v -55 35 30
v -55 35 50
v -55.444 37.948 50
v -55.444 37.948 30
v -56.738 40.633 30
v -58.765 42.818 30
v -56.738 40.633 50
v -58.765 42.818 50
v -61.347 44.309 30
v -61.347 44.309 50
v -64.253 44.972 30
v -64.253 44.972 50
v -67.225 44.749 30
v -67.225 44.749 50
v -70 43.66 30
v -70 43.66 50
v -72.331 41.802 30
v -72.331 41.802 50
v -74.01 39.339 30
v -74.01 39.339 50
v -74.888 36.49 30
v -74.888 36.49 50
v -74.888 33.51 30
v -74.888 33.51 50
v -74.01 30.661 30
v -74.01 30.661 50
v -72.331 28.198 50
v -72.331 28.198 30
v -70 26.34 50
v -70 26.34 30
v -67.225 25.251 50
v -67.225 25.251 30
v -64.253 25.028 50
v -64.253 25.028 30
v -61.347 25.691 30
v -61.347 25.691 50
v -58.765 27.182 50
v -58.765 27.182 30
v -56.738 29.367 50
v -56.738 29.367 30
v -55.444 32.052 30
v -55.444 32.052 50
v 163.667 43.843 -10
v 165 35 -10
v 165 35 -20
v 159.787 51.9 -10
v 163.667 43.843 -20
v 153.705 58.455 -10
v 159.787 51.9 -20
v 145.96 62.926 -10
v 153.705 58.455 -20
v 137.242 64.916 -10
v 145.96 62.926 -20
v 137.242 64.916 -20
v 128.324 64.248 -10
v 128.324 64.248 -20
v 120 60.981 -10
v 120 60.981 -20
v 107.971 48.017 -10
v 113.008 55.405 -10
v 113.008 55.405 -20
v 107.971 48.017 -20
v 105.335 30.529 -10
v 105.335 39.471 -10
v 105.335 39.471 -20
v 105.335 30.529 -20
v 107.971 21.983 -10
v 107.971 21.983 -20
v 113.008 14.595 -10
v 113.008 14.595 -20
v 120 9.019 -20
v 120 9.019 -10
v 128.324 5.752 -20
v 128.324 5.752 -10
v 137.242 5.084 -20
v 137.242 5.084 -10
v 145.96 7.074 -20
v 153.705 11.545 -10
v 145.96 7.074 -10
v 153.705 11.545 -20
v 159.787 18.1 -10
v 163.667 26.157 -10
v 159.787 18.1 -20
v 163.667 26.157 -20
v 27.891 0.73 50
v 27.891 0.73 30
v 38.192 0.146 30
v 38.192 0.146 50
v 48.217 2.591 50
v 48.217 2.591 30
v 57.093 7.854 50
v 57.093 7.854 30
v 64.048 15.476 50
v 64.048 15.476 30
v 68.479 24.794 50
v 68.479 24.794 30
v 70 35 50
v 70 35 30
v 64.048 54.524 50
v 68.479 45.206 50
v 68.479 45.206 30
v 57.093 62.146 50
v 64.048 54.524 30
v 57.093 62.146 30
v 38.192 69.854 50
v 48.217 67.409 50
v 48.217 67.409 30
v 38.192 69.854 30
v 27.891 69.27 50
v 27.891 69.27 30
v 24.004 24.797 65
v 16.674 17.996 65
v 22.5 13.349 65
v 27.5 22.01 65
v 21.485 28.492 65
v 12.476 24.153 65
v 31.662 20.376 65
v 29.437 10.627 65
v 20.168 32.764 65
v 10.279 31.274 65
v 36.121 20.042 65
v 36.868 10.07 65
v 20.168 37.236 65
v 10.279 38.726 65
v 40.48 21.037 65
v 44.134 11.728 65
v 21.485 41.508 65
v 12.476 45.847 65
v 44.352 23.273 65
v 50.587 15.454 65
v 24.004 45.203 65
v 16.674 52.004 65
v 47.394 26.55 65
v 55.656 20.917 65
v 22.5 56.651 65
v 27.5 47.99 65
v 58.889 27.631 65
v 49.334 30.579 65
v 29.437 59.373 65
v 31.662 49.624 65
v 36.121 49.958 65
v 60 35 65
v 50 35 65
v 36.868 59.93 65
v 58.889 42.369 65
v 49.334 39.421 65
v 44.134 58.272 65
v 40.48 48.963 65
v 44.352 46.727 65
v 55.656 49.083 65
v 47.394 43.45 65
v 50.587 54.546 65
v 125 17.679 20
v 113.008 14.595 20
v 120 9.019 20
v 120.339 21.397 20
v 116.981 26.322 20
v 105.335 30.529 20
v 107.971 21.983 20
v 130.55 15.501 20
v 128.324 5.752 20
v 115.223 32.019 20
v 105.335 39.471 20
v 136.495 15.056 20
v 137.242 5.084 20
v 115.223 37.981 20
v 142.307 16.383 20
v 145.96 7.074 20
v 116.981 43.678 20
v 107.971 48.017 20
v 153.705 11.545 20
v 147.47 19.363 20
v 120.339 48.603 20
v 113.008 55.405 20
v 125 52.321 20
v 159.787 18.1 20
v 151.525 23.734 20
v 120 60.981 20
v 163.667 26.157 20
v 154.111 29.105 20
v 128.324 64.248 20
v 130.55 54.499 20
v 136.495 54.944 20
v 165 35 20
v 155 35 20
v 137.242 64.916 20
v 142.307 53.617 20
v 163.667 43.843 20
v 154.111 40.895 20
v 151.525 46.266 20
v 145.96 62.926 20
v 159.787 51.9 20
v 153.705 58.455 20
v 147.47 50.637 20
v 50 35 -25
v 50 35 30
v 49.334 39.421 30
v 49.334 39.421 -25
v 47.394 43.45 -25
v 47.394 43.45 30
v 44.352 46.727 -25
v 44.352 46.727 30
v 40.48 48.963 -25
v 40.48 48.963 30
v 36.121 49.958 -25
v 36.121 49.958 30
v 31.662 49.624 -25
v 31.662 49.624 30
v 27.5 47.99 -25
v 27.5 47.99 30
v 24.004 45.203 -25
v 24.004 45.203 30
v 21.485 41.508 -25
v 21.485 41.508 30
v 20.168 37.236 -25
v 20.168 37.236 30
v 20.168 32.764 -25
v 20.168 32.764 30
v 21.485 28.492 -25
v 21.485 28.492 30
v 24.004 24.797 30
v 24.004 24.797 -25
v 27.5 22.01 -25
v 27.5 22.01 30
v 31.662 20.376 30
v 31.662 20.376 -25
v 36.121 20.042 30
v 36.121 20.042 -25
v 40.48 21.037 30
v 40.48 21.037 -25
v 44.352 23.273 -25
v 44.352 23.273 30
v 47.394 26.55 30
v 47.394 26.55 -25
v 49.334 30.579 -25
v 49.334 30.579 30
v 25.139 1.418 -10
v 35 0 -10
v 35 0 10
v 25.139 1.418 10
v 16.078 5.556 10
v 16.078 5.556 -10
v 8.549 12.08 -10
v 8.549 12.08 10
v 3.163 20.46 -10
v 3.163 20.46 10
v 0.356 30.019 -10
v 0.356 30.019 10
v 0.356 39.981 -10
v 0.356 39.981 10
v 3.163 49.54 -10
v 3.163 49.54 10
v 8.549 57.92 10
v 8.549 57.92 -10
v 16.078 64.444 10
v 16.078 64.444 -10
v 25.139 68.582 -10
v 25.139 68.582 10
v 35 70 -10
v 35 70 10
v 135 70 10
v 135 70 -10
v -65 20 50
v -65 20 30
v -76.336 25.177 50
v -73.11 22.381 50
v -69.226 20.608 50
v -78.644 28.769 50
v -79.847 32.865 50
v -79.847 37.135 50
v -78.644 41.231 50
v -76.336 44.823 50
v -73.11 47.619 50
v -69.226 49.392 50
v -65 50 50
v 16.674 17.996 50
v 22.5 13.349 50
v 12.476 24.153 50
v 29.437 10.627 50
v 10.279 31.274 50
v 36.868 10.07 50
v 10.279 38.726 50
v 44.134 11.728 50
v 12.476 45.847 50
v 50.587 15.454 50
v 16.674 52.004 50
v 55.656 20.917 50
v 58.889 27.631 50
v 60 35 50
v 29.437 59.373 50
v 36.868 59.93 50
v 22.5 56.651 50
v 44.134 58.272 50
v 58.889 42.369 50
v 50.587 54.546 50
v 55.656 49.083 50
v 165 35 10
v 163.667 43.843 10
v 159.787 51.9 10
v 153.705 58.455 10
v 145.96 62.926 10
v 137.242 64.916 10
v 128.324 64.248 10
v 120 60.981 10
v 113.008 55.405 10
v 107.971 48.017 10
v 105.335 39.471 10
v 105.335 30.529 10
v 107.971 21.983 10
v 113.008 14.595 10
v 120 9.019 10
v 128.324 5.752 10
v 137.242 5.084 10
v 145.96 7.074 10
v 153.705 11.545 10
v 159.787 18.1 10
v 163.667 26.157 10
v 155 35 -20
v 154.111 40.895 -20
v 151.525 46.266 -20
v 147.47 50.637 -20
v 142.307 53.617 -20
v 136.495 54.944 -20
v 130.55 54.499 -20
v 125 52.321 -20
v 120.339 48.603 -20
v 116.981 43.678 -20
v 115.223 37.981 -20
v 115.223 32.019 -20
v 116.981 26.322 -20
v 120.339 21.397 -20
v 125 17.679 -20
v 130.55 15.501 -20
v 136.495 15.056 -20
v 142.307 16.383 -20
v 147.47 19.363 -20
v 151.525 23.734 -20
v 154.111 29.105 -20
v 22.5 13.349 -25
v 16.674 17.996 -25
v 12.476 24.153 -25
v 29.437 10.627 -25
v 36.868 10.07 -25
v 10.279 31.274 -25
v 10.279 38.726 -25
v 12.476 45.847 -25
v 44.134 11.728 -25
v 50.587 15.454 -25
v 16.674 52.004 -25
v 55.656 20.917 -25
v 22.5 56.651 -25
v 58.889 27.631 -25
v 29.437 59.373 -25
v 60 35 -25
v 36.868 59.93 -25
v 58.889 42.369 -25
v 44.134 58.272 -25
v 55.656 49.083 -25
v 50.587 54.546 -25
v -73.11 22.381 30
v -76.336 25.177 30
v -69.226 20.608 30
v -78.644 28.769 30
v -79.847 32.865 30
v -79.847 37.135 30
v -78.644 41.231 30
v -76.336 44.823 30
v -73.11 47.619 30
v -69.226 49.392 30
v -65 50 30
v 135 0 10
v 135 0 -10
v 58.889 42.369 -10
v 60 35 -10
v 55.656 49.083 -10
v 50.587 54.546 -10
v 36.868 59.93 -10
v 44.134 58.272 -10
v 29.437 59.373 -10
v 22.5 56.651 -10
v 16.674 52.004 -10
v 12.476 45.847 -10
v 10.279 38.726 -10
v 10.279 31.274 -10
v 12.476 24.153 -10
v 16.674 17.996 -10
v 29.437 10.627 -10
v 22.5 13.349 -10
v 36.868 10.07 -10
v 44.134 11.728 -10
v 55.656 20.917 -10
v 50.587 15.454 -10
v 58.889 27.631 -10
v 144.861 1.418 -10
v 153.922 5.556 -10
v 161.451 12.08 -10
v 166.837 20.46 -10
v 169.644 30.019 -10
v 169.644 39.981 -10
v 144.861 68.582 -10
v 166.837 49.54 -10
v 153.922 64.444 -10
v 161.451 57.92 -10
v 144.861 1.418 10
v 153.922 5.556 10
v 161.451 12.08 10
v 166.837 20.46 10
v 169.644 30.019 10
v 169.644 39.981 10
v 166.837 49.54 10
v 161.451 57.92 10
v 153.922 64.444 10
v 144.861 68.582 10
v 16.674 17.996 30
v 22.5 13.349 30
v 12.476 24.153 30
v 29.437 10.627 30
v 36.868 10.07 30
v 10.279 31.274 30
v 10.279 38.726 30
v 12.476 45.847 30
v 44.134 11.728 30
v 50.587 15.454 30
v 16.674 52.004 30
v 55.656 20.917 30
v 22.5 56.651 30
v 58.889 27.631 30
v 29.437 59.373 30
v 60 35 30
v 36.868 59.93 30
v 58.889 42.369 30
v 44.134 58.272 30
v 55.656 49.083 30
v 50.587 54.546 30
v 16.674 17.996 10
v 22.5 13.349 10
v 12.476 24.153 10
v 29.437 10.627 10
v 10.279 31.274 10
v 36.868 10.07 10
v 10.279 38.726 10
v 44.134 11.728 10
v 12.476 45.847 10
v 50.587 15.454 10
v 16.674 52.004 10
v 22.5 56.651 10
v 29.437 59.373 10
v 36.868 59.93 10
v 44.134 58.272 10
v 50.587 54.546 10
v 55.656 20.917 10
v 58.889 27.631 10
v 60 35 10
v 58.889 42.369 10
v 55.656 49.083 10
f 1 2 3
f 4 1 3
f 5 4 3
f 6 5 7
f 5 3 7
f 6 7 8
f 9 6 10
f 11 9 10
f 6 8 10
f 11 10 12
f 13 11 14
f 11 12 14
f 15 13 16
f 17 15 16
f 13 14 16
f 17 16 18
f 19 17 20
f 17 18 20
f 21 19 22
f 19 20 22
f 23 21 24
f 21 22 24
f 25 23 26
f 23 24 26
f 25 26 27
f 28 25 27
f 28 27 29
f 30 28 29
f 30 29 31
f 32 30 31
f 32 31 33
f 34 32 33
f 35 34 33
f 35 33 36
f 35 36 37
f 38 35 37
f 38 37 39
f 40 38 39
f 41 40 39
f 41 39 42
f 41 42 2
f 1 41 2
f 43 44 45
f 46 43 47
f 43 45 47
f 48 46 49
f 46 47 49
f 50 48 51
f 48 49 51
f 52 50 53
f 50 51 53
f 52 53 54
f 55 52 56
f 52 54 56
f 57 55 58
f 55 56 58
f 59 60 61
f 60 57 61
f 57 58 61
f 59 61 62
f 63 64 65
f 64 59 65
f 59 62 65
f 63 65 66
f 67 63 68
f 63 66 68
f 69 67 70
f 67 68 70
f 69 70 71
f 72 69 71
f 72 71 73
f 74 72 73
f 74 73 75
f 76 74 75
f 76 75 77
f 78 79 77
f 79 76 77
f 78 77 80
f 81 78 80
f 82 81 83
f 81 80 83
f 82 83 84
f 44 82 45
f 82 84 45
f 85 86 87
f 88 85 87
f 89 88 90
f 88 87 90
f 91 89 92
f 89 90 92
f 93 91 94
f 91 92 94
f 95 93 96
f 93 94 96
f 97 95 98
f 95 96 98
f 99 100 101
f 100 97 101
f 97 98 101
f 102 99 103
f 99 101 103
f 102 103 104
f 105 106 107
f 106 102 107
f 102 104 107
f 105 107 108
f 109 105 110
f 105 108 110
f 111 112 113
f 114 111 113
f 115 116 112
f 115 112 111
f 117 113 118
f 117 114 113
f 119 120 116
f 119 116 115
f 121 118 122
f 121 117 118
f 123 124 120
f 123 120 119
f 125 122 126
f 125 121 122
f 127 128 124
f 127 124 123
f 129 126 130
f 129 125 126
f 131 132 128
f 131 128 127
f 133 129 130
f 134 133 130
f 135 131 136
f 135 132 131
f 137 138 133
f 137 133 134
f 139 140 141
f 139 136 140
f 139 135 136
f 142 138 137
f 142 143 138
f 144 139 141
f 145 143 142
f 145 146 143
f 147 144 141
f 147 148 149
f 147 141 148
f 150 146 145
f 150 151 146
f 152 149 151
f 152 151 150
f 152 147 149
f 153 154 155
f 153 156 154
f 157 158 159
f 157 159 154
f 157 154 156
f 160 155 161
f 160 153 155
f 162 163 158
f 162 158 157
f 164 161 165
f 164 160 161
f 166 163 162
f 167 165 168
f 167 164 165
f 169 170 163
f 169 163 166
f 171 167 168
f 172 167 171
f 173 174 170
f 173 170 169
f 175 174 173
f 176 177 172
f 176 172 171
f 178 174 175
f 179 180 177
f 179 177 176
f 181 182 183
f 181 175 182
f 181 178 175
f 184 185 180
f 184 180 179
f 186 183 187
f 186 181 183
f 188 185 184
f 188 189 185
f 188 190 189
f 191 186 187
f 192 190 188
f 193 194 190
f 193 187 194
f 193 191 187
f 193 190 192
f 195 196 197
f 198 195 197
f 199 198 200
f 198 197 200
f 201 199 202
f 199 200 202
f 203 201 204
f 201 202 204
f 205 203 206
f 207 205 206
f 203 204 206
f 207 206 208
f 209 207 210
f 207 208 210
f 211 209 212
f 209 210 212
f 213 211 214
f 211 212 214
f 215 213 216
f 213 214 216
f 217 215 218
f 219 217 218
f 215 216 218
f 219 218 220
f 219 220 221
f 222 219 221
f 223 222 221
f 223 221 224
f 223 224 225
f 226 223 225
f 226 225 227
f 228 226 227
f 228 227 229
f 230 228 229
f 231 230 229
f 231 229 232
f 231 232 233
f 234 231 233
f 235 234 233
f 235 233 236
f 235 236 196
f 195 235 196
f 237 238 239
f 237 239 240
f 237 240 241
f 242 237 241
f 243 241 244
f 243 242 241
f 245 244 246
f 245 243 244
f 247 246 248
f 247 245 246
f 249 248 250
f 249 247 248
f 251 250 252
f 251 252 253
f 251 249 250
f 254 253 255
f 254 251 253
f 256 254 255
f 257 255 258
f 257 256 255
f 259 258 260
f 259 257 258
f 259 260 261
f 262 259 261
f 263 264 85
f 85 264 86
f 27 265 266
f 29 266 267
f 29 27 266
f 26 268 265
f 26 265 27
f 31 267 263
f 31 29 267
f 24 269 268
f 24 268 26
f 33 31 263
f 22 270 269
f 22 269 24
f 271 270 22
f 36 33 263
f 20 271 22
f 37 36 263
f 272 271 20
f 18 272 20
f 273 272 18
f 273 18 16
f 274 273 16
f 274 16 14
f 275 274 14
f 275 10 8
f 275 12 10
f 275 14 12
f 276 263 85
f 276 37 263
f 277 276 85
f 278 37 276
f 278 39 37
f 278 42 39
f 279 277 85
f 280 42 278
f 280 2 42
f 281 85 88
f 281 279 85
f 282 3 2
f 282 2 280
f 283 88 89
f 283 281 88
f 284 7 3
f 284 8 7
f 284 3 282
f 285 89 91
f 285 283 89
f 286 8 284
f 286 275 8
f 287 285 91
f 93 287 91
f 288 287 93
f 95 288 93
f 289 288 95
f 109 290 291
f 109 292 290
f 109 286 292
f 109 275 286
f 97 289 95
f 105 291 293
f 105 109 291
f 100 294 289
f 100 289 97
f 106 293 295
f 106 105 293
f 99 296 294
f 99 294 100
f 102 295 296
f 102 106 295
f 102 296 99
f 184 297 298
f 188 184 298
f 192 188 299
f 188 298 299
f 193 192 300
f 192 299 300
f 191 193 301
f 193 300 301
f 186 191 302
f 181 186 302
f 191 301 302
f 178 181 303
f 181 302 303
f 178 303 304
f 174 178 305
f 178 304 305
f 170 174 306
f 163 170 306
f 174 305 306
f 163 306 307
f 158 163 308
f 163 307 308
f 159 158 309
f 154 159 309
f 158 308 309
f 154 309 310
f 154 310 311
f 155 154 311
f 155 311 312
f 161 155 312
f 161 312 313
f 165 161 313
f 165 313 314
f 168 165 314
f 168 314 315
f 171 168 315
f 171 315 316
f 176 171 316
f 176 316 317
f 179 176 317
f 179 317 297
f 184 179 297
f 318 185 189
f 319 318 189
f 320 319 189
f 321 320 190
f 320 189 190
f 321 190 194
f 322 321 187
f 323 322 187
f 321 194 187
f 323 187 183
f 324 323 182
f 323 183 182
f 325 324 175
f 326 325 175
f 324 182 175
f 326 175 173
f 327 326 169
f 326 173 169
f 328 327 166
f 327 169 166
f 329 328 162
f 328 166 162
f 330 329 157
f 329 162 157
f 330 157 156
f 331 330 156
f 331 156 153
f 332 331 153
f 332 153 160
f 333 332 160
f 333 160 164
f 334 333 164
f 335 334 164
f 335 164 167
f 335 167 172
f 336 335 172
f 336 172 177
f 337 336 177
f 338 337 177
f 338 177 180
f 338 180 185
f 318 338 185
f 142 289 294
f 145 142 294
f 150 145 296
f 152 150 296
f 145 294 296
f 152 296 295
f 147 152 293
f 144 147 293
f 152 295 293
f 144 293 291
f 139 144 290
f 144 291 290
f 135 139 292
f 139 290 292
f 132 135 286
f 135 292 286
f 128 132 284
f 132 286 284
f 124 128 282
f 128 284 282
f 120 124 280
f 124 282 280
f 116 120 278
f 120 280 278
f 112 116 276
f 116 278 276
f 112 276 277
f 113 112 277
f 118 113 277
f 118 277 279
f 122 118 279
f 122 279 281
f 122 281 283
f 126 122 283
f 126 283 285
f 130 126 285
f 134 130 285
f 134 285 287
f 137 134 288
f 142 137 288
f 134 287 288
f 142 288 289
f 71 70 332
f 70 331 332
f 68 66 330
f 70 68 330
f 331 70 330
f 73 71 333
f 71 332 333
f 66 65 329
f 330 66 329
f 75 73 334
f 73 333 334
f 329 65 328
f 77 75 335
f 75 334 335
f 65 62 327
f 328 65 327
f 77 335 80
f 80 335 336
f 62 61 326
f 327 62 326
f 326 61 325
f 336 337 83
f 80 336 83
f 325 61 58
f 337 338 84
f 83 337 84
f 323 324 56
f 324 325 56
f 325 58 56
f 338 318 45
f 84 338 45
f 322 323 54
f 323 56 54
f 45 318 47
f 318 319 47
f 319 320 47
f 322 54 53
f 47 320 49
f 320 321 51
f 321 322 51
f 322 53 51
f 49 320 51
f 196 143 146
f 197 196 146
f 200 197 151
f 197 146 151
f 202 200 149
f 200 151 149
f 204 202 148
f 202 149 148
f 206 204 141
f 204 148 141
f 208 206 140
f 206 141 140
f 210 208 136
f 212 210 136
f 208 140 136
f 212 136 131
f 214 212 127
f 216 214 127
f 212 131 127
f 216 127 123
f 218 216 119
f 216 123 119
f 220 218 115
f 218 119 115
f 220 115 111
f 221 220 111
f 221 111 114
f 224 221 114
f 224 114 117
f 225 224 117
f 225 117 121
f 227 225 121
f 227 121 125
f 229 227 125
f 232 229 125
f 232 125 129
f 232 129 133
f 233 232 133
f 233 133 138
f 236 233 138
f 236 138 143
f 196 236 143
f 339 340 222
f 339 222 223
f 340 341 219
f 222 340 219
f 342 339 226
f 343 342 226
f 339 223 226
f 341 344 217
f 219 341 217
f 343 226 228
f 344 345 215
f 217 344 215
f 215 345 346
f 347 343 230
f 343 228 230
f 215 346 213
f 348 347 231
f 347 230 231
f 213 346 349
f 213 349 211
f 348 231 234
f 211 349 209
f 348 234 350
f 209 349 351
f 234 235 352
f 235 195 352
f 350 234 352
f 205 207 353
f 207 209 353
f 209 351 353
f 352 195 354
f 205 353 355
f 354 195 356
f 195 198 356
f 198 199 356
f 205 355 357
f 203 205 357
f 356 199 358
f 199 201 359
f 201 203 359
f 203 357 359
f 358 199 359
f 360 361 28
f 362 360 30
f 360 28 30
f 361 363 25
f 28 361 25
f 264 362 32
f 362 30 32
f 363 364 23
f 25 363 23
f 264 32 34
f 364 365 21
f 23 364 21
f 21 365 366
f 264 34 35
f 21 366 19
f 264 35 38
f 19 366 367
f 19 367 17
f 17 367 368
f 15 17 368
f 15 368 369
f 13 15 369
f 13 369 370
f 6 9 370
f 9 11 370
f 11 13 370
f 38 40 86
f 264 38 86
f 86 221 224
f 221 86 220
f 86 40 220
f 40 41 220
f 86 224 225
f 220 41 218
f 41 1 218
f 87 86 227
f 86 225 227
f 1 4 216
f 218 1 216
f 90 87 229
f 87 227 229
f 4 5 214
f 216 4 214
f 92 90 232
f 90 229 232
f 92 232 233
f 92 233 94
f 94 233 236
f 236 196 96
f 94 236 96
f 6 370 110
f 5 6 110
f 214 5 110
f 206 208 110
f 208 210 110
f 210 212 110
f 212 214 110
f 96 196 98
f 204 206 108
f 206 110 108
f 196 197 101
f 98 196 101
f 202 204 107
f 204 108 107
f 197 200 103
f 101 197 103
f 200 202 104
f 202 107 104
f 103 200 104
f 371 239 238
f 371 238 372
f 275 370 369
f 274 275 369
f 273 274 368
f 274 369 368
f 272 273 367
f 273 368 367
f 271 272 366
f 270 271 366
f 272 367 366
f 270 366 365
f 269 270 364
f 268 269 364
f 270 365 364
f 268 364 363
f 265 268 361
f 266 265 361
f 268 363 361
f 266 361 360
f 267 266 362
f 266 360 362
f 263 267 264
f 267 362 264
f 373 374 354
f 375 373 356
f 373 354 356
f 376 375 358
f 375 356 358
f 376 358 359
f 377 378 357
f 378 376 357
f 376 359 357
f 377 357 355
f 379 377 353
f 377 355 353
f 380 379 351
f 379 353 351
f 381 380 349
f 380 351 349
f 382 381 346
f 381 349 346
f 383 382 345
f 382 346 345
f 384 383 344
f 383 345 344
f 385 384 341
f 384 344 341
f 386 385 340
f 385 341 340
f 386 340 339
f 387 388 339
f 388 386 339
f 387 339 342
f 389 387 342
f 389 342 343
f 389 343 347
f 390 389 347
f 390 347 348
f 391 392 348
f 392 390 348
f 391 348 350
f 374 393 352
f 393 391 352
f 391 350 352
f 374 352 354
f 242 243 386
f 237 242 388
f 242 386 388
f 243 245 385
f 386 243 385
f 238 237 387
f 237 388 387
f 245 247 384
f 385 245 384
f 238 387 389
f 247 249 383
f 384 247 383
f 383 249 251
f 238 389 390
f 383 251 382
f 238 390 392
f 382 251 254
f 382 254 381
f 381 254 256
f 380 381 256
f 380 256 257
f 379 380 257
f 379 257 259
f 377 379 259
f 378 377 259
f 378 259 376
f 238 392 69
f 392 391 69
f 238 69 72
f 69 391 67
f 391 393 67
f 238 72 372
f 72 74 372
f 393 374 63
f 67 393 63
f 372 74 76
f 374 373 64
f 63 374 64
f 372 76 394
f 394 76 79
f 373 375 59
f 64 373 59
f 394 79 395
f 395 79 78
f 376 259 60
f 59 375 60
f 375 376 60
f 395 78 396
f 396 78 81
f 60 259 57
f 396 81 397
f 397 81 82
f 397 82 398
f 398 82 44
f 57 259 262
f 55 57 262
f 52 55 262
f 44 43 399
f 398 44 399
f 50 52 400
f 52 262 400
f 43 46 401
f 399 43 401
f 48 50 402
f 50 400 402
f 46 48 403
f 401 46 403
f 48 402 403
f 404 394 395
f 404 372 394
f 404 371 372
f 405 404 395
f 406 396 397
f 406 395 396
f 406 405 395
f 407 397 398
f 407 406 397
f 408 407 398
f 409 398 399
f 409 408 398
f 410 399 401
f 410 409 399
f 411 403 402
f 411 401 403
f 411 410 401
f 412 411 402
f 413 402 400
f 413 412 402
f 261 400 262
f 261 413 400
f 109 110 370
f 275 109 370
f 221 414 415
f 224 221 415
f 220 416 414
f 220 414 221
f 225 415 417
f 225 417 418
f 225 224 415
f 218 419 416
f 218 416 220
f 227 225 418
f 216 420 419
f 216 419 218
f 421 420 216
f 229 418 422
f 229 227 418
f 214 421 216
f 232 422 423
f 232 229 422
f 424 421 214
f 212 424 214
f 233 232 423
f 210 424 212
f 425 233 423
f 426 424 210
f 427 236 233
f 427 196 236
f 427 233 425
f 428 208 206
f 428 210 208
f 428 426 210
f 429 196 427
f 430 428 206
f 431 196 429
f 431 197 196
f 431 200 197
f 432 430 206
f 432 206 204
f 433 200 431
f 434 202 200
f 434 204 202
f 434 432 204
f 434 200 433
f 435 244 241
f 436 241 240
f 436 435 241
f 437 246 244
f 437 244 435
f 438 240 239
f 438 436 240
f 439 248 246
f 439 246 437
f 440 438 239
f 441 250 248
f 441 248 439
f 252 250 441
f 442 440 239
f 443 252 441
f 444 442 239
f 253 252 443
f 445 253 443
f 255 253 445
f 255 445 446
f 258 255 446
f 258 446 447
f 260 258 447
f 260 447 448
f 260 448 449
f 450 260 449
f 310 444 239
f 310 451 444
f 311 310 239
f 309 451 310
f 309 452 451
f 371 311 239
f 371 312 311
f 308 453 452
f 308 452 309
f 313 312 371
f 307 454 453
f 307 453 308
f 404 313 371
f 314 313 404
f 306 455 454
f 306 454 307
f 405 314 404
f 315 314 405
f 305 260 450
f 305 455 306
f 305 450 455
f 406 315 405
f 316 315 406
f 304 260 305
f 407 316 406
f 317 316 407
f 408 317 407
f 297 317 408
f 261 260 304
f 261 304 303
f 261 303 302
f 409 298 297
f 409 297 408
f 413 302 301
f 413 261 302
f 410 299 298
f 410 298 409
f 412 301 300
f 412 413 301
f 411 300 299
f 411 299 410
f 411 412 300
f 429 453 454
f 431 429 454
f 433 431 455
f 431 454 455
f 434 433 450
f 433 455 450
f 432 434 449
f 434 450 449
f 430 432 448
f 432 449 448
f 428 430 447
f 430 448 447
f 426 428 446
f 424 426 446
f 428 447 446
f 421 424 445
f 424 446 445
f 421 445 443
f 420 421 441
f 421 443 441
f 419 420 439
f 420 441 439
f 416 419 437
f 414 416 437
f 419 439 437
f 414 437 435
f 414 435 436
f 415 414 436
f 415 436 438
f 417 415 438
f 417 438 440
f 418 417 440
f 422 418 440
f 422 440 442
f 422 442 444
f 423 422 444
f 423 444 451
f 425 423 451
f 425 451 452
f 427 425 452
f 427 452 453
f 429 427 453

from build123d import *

# Parameters (mm, degrees)
SKETCH1_W                = 170
SKETCH1_H                = 70
BOSS_EXTRUDE1_DEPTH      = 10
FILLET1_RADIUS           = 35
FILLET1_LENGTH           = 20
FILLET2_RADIUS           = 35
FILLET2_LENGTH           = 20
BOSS_EXTRUDE2_DEPTH      = 10
BOSS_EXTRUDE2_DEPTH_BACK = 30
SKETCH2_R                = 30
BOSS_EXTRUDE3_DEPTH      = 20
BOSS_EXTRUDE3_DEPTH_BACK = 35
SKETCH3_R                = 25
SKETCH4_R                = 35
SKETCH4_R_2              = 25
BOSS_EXTRUDE4_DEPTH      = 20
SKETCH5_R                = 25
BOSS_EXTRUDE5_DEPTH      = 15
SKETCH6_R                = 10
SKETCH6_R_2              = 15
SKETCH6_R_3              = 20
CUT_EXTRUDE1_DEPTH       = 205.694894905


with BuildPart() as part:
    # Sketch1 → Boss-Extrude1 (new, symmetric)
    with BuildSketch(Plane.XY):
        with Locations((85, 35)):
            Rectangle(SKETCH1_W, SKETCH1_H)
    extrude(amount=BOSS_EXTRUDE1_DEPTH, both=True)

    # Fillet1: full round fillet: the end face becomes a half cylinder, R = half its width
    fillet1_face = Plane((170, 35, 0), x_dir=(0, 0, 1), z_dir=(1, 0, 0))  # on the end face: x along it, z out of the body
    fillet1_slab = fillet1_face.offset(-FILLET1_RADIUS / 2) * Box(FILLET1_LENGTH, 2 * FILLET1_RADIUS, FILLET1_RADIUS, mode=Mode.PRIVATE)  # the body's end, R deep
    fillet1_round = Plane((135, 35, 0), x_dir=(1, 0, 0), z_dir=(0, 0, 1)) * Cylinder(FILLET1_RADIUS, FILLET1_LENGTH, mode=Mode.PRIVATE)  # its axis R under the face
    add(fillet1_slab - fillet1_round, mode=Mode.SUBTRACT)

    # Fillet2: full round fillet: the end face becomes a half cylinder, R = half its width
    fillet2_face = Plane((0, 35, 0), x_dir=(0, 0, -1), z_dir=(-1, 0, 0))  # on the end face: x along it, z out of the body
    fillet2_slab = fillet2_face.offset(-FILLET2_RADIUS / 2) * Box(FILLET2_LENGTH, 2 * FILLET2_RADIUS, FILLET2_RADIUS, mode=Mode.PRIVATE)  # the body's end, R deep
    fillet2_round = Plane((35, 35, 0), x_dir=(-1, 0, 0), z_dir=(0, 0, -1)) * Cylinder(FILLET2_RADIUS, FILLET2_LENGTH, mode=Mode.PRIVATE)  # its axis R under the face
    add(fillet2_slab - fillet2_round, mode=Mode.SUBTRACT)

    # Sketch2 → Boss-Extrude2 (add, two sides: drawn at the far end of the back side and taken through both)
    with BuildSketch(Plane.XY.offset(10).offset(-BOSS_EXTRUDE2_DEPTH_BACK)):
        with Locations((135, 35)):
            Circle(SKETCH2_R)
    extrude(amount=BOSS_EXTRUDE2_DEPTH + BOSS_EXTRUDE2_DEPTH_BACK)

    # Sketch3 → Boss-Extrude3 (add, two sides: drawn at the far end of the back side and taken through both)
    with BuildSketch(Plane.XY.offset(10).offset(-BOSS_EXTRUDE3_DEPTH_BACK)):
        with Locations((35, 35)):
            Circle(SKETCH3_R)
    extrude(amount=BOSS_EXTRUDE3_DEPTH + BOSS_EXTRUDE3_DEPTH_BACK)


with BuildPart() as body_2:
    # Sketch4 → Boss-Extrude4 (new body)
    # profile 1 of 3: a face of its own
    with BuildSketch(Plane.XY.offset(30)):
        with BuildLine():
            ThreePointArc((-65, 50), (-80, 35), (-65, 20))
            Line((-65, 20), (27.890549941, 0.729667059))
            ThreePointArc((27.890549941, 0.729667059), (0, 35), (27.890549941, 69.270332941))
            Line((27.890549941, 69.270332941), (-65, 50))
        make_face()
    # profile 2 of 3: a face of its own
    with BuildSketch(Plane.XY.offset(30)):
        with Locations((35, 35)):
            Circle(SKETCH4_R)
        with Locations((35, 35)):
            Circle(SKETCH4_R_2, mode=Mode.SUBTRACT)
    # profile 3 of 3: a face of its own
    with BuildSketch(Plane.XY.offset(30)):
        with Locations((35, 35)):
            Circle(SKETCH4_R_2)
    extrude(amount=BOSS_EXTRUDE4_DEPTH)

    # Sketch5 → Boss-Extrude5 (add)
    with BuildSketch(Plane.XY.offset(50)):
        with Locations((35, 35)):
            Circle(SKETCH5_R)
    extrude(amount=BOSS_EXTRUDE5_DEPTH)


with BuildPart() as cut_extrude1_tool:
    # Sketch6 → Cut-Extrude1 (new, through all)
    with BuildSketch(Plane.XY.offset(65)):
        with Locations((-65, 35)):
            Circle(SKETCH6_R)
        with Locations((35, 35)):
            Circle(SKETCH6_R_2)
        with Locations((135, 35)):
            Circle(SKETCH6_R_3)
    extrude(amount=-CUT_EXTRUDE1_DEPTH)


with BuildPart() as part_1:
    add(part.part)

    # Cut-Extrude1: cut by cut_extrude1_tool
    add(cut_extrude1_tool.part, mode=Mode.SUBTRACT)


with BuildPart() as body_2_1:
    add(body_2.part)

    # Cut-Extrude1: cut by cut_extrude1_tool
    add(cut_extrude1_tool.part, mode=Mode.SUBTRACT)


solid = Compound([part_1.part, body_2_1.part])
